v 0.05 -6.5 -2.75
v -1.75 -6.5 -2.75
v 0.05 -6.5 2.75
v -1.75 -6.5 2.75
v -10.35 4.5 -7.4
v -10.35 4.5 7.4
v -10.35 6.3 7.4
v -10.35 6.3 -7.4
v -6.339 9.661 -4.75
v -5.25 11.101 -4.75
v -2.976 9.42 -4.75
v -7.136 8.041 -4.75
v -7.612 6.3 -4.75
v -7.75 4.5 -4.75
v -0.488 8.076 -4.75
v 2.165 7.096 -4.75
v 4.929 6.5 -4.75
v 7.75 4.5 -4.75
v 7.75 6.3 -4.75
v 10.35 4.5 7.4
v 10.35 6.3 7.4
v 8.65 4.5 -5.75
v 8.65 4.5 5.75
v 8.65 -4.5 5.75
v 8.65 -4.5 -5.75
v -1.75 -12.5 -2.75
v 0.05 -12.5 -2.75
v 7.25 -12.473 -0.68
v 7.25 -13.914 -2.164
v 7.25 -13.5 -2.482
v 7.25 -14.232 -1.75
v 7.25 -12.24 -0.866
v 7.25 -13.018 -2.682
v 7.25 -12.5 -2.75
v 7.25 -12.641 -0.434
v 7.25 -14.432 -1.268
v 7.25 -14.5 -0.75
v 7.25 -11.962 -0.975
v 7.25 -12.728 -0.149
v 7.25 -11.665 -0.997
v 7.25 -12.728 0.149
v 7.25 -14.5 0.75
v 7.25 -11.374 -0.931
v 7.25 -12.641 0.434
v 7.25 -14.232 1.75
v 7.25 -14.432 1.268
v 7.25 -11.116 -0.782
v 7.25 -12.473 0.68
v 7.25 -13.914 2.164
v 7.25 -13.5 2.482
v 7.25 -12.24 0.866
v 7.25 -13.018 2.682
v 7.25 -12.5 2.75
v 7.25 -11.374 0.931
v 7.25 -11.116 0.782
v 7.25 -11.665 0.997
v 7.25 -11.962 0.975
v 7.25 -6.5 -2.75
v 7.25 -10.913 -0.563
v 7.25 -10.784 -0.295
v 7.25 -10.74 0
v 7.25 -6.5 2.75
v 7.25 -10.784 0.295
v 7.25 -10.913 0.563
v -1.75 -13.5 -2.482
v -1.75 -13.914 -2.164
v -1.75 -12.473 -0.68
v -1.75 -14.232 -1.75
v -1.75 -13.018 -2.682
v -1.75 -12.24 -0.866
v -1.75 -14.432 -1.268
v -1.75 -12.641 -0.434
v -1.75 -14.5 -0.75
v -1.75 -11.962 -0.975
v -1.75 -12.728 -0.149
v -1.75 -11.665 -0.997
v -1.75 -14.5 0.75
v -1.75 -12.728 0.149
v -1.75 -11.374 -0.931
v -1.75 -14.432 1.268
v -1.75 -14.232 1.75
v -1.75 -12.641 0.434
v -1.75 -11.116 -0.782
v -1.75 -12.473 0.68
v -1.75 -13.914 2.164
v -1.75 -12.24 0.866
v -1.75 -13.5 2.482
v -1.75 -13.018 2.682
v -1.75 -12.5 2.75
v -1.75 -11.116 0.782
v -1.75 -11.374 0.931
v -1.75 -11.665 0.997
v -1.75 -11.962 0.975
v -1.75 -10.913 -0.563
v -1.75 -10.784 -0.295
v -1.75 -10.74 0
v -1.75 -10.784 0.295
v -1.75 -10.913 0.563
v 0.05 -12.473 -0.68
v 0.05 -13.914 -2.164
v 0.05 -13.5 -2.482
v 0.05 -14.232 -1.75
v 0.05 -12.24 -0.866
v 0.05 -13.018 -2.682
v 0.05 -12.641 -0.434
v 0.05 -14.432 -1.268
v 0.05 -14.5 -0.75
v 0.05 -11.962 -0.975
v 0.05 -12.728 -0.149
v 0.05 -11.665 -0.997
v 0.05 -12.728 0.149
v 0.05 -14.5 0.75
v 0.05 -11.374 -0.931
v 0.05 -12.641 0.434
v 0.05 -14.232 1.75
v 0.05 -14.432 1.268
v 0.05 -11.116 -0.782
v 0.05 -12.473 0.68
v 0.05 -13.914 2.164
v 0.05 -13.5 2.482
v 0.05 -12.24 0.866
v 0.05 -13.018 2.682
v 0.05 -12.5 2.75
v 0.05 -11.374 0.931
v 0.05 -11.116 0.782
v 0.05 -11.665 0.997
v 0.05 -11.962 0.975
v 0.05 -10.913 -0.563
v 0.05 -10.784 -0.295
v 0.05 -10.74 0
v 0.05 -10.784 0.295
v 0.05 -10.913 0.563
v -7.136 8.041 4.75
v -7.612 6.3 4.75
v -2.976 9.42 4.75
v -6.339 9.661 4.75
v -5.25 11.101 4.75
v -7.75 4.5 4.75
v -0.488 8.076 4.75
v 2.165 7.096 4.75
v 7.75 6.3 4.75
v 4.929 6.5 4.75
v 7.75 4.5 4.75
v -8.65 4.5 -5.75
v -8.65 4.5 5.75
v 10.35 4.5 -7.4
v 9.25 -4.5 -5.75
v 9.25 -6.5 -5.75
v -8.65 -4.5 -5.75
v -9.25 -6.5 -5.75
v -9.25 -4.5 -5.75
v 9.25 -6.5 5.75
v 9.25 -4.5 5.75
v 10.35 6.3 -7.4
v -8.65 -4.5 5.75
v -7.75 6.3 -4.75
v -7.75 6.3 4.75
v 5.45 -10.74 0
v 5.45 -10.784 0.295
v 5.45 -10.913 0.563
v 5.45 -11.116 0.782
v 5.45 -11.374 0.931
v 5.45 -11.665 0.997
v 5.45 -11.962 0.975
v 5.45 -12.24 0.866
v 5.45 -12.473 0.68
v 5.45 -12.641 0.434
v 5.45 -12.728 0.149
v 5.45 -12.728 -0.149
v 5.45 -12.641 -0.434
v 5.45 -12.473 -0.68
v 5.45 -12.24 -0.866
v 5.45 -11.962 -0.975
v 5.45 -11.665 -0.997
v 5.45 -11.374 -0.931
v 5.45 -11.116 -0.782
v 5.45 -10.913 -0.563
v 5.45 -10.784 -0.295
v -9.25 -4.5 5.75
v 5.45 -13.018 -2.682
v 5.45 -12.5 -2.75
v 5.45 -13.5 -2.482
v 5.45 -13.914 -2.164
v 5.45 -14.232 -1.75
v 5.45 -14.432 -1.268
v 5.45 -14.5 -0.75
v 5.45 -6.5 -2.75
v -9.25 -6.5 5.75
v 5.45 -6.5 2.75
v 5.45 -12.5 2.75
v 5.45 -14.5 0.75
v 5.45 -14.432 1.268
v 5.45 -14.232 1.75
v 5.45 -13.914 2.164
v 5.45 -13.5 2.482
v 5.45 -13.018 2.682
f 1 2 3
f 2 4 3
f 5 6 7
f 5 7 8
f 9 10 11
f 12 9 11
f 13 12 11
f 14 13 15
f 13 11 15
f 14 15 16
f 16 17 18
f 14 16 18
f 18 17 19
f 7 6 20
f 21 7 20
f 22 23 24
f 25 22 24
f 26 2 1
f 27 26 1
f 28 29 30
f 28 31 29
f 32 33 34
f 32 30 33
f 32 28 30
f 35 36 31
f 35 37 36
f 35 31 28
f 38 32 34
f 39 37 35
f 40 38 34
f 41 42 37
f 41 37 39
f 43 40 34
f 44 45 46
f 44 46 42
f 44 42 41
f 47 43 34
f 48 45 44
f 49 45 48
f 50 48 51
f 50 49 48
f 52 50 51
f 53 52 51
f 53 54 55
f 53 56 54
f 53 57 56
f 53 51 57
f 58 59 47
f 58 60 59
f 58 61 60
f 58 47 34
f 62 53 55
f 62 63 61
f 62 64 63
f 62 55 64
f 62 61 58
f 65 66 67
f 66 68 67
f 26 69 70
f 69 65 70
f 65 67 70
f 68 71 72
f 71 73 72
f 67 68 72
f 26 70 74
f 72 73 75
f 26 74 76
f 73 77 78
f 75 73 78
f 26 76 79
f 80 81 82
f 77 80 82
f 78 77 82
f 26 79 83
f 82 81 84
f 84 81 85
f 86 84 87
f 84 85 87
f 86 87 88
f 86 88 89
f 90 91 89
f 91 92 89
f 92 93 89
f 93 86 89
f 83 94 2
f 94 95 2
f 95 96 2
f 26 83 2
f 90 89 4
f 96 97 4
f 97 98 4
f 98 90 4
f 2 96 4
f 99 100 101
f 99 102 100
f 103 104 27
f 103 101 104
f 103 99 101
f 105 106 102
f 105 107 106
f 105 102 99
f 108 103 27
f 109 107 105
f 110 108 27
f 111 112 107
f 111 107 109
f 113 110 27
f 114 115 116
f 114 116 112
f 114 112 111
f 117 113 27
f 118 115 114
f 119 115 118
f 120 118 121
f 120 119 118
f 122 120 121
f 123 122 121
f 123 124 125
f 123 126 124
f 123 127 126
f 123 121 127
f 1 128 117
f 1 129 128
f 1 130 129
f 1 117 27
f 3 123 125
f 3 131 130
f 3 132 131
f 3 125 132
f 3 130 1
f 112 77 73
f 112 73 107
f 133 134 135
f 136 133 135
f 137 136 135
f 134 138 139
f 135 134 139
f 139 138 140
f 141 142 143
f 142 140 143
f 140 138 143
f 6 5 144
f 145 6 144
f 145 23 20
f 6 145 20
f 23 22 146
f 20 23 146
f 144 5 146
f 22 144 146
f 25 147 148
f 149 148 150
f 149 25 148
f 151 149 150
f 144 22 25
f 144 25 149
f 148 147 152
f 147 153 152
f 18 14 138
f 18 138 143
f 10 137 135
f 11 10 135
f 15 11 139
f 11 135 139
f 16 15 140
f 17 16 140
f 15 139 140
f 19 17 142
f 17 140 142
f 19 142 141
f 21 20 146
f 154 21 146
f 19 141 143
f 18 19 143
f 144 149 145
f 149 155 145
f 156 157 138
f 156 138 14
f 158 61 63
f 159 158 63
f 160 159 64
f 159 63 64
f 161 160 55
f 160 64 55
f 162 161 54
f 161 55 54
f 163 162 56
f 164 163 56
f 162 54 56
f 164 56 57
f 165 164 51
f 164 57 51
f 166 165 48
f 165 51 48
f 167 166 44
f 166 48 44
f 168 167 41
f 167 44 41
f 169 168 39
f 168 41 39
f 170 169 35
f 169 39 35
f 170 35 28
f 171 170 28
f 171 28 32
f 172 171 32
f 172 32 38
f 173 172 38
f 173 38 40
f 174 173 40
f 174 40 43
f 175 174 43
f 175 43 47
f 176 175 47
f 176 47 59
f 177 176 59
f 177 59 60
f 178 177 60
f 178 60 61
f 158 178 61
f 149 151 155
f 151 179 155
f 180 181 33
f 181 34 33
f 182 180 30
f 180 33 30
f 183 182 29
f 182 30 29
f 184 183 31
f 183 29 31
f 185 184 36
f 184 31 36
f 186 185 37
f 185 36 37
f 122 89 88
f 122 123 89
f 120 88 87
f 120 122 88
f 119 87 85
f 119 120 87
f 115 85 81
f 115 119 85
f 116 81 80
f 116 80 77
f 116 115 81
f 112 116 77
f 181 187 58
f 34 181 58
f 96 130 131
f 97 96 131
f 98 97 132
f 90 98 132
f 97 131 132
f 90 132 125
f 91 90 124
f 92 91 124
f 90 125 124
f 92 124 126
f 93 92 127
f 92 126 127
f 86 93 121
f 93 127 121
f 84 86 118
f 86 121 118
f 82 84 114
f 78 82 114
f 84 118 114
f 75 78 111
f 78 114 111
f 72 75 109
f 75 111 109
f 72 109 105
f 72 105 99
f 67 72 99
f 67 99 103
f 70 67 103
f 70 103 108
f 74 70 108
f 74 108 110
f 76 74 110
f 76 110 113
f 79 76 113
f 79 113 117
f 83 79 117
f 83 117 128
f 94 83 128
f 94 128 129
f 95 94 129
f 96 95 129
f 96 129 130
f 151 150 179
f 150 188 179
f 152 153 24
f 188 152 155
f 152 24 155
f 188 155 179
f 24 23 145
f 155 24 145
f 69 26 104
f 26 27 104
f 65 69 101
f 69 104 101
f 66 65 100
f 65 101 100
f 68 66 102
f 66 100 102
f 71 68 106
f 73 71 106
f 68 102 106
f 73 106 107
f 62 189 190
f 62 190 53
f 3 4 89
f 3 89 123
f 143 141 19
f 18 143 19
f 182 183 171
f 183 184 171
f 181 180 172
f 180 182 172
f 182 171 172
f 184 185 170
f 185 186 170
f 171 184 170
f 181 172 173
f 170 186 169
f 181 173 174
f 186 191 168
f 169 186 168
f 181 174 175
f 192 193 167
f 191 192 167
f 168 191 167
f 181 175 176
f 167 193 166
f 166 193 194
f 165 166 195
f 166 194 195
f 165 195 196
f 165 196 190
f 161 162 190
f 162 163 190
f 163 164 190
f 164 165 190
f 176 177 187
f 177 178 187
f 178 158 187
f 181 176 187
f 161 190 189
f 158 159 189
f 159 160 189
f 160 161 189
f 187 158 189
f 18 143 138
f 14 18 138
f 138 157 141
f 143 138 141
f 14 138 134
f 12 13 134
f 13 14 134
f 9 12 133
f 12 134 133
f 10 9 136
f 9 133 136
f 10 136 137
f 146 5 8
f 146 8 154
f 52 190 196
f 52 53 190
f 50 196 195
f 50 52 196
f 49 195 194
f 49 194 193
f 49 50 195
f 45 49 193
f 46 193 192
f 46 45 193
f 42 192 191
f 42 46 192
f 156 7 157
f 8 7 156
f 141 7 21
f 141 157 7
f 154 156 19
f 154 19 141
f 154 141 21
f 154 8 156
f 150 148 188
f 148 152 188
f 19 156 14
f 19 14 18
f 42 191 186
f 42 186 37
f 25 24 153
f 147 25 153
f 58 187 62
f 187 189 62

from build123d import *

# Parameters (mm, degrees)
SALIENTE_EXTRUIR1_DEPTH             = 5.75
CROQUIS2_W                          = 20.7
CROQUIS2_H                          = 14.8
SALIENTE_EXTRUIR2_DEPTH             = 1.8
CROQUIS3_W                          = 15.5
CROQUIS3_H                          = 9.5
CORTAR_EXTRUIR1_DEPTH               = 1.8
SALIENTE_EXTRUIR3_REACH             = 16.287
SALIENTE_EXTRUIR3_DIRECTION_2_REACH = 16.287
CROQUIS7_W                          = 1.8
CROQUIS7_H                          = 8
SALIENTE_EXTRUIR4_DEPTH             = 2.75
SALIENTE_EXTRUIR4_2_DEPTH           = 2.75
REDONDEO1_R                         = 2
REDONDEO2_R                         = 2
CROQUIS9_R                          = 1
CORTAR_EXTRUIR2_DEPTH               = 24.974361305


with BuildPart() as part:
    # Croquis1 → Saliente-Extruir1 (new, symmetric)
    with BuildSketch(Plane.XY):
        Polygon((8.65, -4.5), (9.25, -4.5), (9.25, -6.5), (-9.25, -6.5), (-9.25, -4.5), (-8.65, -4.5), (-8.65, 4.5), (8.65, 4.5), align=None)
    extrude(amount=SALIENTE_EXTRUIR1_DEPTH, both=True)

    # Croquis2 → Saliente-Extruir2 (add)
    with BuildSketch(Plane(origin=(0, 4.5, 0), x_dir=(1, 0, 0), z_dir=(0, 1, 0))):
        Rectangle(CROQUIS2_W, CROQUIS2_H)
    extrude(amount=SALIENTE_EXTRUIR2_DEPTH)

    # Croquis3 → Cortar-Extruir1 (cut)
    with BuildSketch(Plane(origin=(0, 6.3, 0), x_dir=(1, 0, 0), z_dir=(0, 1, 0))):
        Rectangle(CROQUIS3_W, CROQUIS3_H)
    extrude(amount=-CORTAR_EXTRUIR1_DEPTH, mode=Mode.SUBTRACT)


with BuildPart() as body_2:

    # Saliente-Extruir3: up to this face of the body (flat: up to its plane)
    saliente_extruir3_end = Plane(part.part.faces().sort_by_distance((0, 5.4, 4.75))[0])
    # Croquis4 → Saliente-Extruir3 (new, up to the picked face)
    with BuildSketch(Plane.XY, mode=Mode.PRIVATE) as saliente_extruir3_sk1:
        with BuildLine():
            Line((7.75, 4.5), (-7.75, 4.5))
            ThreePointArc((-7.75, 4.5), (-7.13588418, 8.041475131), (-5.25, 11.101315846))
            ThreePointArc((-5.25, 11.101315846), (0.820847204, 7.538687638), (7.75, 6.3))
            Line((7.75, 6.3), (7.75, 4.5))
        make_face()
    saliente_extruir3_tool1 = split(extrude(saliente_extruir3_sk1.sketch, amount=SALIENTE_EXTRUIR3_REACH, mode=Mode.PRIVATE), bisect_by=saliente_extruir3_end, keep=Keep.BOTH, mode=Mode.PRIVATE)
    add(saliente_extruir3_tool1.solids().sort_by(Axis((-1.534706, 6.575986, 0), (0, 0, 1)))[0])


    # Saliente-Extruir3 direction 2: up to this face of the body (flat: up to its plane)
    saliente_extruir3_direction_2_end = Plane(part.part.faces().sort_by_distance((0, 5.4, -4.75))[0])
    # Croquis4 → Saliente-Extruir3 direction 2 (add, up to the picked face)
    with BuildSketch(Plane.XY, mode=Mode.PRIVATE) as saliente_extruir3_direction_2_sk1:
        with BuildLine():
            Line((7.75, 4.5), (-7.75, 4.5))
            ThreePointArc((-7.75, 4.5), (-7.13588418, 8.041475131), (-5.25, 11.101315846))
            ThreePointArc((-5.25, 11.101315846), (0.820847204, 7.538687638), (7.75, 6.3))
            Line((7.75, 6.3), (7.75, 4.5))
        make_face()
    saliente_extruir3_direction_2_tool1 = split(extrude(saliente_extruir3_direction_2_sk1.sketch, amount=-SALIENTE_EXTRUIR3_DIRECTION_2_REACH, mode=Mode.PRIVATE), bisect_by=saliente_extruir3_direction_2_end, keep=Keep.BOTH, mode=Mode.PRIVATE)
    add(saliente_extruir3_direction_2_tool1.solids().sort_by(Axis((-1.534706, 6.575986, 0), (0, 0, -1)))[0])


with BuildPart() as body_3:
    # Croquis7 → Saliente-Extruir4 (new, symmetric)
    with BuildSketch(Plane.XY):
        with Locations((6.35, -10.5)):
            Rectangle(CROQUIS7_W, CROQUIS7_H)
    extrude(amount=SALIENTE_EXTRUIR4_DEPTH, both=True)

    # Redondeo2
    redondeo2_edges = [body_3.edges().sort_by_distance(p)[0] for p in [
        (6.35, -14.5, -2.75),
        (6.35, -14.5, 2.75),
    ]]
    fillet(redondeo2_edges, radius=REDONDEO2_R)


with BuildPart() as body_4:
    # Croquis7 → Saliente-Extruir4 2 (new, symmetric)
    with BuildSketch(Plane.XY):
        with Locations((-0.85, -10.5)):
            Rectangle(CROQUIS7_W, CROQUIS7_H)
    extrude(amount=SALIENTE_EXTRUIR4_2_DEPTH, both=True)

    # Redondeo1
    redondeo1_edges = [body_4.edges().sort_by_distance(p)[0] for p in [
        (-0.85, -14.5, 2.75),
        (-0.85, -14.5, -2.75),
    ]]
    fillet(redondeo1_edges, radius=REDONDEO1_R)


with BuildPart() as cortar_extruir2_tool:
    # Croquis9 → Cortar-Extruir2 (new, through all)
    with BuildSketch(Plane(origin=(7.25, 0, 0), x_dir=(0, 0, -1), z_dir=(1, 0, 0))):
        with Locations(Location((0, -11.739625203, 0), (0, 0, 90))):
            Circle(CROQUIS9_R)
    extrude(amount=-CORTAR_EXTRUIR2_DEPTH)


with BuildPart() as body_3_1:
    add(body_3.part)

    # Cortar-Extruir2: cut by cortar_extruir2_tool
    add(cortar_extruir2_tool.part, mode=Mode.SUBTRACT)


with BuildPart() as body_4_1:
    add(body_4.part)

    # Cortar-Extruir2: cut by cortar_extruir2_tool
    add(cortar_extruir2_tool.part, mode=Mode.SUBTRACT)


solid = Compound([part.part, body_2.part, body_3_1.part, body_4_1.part])
